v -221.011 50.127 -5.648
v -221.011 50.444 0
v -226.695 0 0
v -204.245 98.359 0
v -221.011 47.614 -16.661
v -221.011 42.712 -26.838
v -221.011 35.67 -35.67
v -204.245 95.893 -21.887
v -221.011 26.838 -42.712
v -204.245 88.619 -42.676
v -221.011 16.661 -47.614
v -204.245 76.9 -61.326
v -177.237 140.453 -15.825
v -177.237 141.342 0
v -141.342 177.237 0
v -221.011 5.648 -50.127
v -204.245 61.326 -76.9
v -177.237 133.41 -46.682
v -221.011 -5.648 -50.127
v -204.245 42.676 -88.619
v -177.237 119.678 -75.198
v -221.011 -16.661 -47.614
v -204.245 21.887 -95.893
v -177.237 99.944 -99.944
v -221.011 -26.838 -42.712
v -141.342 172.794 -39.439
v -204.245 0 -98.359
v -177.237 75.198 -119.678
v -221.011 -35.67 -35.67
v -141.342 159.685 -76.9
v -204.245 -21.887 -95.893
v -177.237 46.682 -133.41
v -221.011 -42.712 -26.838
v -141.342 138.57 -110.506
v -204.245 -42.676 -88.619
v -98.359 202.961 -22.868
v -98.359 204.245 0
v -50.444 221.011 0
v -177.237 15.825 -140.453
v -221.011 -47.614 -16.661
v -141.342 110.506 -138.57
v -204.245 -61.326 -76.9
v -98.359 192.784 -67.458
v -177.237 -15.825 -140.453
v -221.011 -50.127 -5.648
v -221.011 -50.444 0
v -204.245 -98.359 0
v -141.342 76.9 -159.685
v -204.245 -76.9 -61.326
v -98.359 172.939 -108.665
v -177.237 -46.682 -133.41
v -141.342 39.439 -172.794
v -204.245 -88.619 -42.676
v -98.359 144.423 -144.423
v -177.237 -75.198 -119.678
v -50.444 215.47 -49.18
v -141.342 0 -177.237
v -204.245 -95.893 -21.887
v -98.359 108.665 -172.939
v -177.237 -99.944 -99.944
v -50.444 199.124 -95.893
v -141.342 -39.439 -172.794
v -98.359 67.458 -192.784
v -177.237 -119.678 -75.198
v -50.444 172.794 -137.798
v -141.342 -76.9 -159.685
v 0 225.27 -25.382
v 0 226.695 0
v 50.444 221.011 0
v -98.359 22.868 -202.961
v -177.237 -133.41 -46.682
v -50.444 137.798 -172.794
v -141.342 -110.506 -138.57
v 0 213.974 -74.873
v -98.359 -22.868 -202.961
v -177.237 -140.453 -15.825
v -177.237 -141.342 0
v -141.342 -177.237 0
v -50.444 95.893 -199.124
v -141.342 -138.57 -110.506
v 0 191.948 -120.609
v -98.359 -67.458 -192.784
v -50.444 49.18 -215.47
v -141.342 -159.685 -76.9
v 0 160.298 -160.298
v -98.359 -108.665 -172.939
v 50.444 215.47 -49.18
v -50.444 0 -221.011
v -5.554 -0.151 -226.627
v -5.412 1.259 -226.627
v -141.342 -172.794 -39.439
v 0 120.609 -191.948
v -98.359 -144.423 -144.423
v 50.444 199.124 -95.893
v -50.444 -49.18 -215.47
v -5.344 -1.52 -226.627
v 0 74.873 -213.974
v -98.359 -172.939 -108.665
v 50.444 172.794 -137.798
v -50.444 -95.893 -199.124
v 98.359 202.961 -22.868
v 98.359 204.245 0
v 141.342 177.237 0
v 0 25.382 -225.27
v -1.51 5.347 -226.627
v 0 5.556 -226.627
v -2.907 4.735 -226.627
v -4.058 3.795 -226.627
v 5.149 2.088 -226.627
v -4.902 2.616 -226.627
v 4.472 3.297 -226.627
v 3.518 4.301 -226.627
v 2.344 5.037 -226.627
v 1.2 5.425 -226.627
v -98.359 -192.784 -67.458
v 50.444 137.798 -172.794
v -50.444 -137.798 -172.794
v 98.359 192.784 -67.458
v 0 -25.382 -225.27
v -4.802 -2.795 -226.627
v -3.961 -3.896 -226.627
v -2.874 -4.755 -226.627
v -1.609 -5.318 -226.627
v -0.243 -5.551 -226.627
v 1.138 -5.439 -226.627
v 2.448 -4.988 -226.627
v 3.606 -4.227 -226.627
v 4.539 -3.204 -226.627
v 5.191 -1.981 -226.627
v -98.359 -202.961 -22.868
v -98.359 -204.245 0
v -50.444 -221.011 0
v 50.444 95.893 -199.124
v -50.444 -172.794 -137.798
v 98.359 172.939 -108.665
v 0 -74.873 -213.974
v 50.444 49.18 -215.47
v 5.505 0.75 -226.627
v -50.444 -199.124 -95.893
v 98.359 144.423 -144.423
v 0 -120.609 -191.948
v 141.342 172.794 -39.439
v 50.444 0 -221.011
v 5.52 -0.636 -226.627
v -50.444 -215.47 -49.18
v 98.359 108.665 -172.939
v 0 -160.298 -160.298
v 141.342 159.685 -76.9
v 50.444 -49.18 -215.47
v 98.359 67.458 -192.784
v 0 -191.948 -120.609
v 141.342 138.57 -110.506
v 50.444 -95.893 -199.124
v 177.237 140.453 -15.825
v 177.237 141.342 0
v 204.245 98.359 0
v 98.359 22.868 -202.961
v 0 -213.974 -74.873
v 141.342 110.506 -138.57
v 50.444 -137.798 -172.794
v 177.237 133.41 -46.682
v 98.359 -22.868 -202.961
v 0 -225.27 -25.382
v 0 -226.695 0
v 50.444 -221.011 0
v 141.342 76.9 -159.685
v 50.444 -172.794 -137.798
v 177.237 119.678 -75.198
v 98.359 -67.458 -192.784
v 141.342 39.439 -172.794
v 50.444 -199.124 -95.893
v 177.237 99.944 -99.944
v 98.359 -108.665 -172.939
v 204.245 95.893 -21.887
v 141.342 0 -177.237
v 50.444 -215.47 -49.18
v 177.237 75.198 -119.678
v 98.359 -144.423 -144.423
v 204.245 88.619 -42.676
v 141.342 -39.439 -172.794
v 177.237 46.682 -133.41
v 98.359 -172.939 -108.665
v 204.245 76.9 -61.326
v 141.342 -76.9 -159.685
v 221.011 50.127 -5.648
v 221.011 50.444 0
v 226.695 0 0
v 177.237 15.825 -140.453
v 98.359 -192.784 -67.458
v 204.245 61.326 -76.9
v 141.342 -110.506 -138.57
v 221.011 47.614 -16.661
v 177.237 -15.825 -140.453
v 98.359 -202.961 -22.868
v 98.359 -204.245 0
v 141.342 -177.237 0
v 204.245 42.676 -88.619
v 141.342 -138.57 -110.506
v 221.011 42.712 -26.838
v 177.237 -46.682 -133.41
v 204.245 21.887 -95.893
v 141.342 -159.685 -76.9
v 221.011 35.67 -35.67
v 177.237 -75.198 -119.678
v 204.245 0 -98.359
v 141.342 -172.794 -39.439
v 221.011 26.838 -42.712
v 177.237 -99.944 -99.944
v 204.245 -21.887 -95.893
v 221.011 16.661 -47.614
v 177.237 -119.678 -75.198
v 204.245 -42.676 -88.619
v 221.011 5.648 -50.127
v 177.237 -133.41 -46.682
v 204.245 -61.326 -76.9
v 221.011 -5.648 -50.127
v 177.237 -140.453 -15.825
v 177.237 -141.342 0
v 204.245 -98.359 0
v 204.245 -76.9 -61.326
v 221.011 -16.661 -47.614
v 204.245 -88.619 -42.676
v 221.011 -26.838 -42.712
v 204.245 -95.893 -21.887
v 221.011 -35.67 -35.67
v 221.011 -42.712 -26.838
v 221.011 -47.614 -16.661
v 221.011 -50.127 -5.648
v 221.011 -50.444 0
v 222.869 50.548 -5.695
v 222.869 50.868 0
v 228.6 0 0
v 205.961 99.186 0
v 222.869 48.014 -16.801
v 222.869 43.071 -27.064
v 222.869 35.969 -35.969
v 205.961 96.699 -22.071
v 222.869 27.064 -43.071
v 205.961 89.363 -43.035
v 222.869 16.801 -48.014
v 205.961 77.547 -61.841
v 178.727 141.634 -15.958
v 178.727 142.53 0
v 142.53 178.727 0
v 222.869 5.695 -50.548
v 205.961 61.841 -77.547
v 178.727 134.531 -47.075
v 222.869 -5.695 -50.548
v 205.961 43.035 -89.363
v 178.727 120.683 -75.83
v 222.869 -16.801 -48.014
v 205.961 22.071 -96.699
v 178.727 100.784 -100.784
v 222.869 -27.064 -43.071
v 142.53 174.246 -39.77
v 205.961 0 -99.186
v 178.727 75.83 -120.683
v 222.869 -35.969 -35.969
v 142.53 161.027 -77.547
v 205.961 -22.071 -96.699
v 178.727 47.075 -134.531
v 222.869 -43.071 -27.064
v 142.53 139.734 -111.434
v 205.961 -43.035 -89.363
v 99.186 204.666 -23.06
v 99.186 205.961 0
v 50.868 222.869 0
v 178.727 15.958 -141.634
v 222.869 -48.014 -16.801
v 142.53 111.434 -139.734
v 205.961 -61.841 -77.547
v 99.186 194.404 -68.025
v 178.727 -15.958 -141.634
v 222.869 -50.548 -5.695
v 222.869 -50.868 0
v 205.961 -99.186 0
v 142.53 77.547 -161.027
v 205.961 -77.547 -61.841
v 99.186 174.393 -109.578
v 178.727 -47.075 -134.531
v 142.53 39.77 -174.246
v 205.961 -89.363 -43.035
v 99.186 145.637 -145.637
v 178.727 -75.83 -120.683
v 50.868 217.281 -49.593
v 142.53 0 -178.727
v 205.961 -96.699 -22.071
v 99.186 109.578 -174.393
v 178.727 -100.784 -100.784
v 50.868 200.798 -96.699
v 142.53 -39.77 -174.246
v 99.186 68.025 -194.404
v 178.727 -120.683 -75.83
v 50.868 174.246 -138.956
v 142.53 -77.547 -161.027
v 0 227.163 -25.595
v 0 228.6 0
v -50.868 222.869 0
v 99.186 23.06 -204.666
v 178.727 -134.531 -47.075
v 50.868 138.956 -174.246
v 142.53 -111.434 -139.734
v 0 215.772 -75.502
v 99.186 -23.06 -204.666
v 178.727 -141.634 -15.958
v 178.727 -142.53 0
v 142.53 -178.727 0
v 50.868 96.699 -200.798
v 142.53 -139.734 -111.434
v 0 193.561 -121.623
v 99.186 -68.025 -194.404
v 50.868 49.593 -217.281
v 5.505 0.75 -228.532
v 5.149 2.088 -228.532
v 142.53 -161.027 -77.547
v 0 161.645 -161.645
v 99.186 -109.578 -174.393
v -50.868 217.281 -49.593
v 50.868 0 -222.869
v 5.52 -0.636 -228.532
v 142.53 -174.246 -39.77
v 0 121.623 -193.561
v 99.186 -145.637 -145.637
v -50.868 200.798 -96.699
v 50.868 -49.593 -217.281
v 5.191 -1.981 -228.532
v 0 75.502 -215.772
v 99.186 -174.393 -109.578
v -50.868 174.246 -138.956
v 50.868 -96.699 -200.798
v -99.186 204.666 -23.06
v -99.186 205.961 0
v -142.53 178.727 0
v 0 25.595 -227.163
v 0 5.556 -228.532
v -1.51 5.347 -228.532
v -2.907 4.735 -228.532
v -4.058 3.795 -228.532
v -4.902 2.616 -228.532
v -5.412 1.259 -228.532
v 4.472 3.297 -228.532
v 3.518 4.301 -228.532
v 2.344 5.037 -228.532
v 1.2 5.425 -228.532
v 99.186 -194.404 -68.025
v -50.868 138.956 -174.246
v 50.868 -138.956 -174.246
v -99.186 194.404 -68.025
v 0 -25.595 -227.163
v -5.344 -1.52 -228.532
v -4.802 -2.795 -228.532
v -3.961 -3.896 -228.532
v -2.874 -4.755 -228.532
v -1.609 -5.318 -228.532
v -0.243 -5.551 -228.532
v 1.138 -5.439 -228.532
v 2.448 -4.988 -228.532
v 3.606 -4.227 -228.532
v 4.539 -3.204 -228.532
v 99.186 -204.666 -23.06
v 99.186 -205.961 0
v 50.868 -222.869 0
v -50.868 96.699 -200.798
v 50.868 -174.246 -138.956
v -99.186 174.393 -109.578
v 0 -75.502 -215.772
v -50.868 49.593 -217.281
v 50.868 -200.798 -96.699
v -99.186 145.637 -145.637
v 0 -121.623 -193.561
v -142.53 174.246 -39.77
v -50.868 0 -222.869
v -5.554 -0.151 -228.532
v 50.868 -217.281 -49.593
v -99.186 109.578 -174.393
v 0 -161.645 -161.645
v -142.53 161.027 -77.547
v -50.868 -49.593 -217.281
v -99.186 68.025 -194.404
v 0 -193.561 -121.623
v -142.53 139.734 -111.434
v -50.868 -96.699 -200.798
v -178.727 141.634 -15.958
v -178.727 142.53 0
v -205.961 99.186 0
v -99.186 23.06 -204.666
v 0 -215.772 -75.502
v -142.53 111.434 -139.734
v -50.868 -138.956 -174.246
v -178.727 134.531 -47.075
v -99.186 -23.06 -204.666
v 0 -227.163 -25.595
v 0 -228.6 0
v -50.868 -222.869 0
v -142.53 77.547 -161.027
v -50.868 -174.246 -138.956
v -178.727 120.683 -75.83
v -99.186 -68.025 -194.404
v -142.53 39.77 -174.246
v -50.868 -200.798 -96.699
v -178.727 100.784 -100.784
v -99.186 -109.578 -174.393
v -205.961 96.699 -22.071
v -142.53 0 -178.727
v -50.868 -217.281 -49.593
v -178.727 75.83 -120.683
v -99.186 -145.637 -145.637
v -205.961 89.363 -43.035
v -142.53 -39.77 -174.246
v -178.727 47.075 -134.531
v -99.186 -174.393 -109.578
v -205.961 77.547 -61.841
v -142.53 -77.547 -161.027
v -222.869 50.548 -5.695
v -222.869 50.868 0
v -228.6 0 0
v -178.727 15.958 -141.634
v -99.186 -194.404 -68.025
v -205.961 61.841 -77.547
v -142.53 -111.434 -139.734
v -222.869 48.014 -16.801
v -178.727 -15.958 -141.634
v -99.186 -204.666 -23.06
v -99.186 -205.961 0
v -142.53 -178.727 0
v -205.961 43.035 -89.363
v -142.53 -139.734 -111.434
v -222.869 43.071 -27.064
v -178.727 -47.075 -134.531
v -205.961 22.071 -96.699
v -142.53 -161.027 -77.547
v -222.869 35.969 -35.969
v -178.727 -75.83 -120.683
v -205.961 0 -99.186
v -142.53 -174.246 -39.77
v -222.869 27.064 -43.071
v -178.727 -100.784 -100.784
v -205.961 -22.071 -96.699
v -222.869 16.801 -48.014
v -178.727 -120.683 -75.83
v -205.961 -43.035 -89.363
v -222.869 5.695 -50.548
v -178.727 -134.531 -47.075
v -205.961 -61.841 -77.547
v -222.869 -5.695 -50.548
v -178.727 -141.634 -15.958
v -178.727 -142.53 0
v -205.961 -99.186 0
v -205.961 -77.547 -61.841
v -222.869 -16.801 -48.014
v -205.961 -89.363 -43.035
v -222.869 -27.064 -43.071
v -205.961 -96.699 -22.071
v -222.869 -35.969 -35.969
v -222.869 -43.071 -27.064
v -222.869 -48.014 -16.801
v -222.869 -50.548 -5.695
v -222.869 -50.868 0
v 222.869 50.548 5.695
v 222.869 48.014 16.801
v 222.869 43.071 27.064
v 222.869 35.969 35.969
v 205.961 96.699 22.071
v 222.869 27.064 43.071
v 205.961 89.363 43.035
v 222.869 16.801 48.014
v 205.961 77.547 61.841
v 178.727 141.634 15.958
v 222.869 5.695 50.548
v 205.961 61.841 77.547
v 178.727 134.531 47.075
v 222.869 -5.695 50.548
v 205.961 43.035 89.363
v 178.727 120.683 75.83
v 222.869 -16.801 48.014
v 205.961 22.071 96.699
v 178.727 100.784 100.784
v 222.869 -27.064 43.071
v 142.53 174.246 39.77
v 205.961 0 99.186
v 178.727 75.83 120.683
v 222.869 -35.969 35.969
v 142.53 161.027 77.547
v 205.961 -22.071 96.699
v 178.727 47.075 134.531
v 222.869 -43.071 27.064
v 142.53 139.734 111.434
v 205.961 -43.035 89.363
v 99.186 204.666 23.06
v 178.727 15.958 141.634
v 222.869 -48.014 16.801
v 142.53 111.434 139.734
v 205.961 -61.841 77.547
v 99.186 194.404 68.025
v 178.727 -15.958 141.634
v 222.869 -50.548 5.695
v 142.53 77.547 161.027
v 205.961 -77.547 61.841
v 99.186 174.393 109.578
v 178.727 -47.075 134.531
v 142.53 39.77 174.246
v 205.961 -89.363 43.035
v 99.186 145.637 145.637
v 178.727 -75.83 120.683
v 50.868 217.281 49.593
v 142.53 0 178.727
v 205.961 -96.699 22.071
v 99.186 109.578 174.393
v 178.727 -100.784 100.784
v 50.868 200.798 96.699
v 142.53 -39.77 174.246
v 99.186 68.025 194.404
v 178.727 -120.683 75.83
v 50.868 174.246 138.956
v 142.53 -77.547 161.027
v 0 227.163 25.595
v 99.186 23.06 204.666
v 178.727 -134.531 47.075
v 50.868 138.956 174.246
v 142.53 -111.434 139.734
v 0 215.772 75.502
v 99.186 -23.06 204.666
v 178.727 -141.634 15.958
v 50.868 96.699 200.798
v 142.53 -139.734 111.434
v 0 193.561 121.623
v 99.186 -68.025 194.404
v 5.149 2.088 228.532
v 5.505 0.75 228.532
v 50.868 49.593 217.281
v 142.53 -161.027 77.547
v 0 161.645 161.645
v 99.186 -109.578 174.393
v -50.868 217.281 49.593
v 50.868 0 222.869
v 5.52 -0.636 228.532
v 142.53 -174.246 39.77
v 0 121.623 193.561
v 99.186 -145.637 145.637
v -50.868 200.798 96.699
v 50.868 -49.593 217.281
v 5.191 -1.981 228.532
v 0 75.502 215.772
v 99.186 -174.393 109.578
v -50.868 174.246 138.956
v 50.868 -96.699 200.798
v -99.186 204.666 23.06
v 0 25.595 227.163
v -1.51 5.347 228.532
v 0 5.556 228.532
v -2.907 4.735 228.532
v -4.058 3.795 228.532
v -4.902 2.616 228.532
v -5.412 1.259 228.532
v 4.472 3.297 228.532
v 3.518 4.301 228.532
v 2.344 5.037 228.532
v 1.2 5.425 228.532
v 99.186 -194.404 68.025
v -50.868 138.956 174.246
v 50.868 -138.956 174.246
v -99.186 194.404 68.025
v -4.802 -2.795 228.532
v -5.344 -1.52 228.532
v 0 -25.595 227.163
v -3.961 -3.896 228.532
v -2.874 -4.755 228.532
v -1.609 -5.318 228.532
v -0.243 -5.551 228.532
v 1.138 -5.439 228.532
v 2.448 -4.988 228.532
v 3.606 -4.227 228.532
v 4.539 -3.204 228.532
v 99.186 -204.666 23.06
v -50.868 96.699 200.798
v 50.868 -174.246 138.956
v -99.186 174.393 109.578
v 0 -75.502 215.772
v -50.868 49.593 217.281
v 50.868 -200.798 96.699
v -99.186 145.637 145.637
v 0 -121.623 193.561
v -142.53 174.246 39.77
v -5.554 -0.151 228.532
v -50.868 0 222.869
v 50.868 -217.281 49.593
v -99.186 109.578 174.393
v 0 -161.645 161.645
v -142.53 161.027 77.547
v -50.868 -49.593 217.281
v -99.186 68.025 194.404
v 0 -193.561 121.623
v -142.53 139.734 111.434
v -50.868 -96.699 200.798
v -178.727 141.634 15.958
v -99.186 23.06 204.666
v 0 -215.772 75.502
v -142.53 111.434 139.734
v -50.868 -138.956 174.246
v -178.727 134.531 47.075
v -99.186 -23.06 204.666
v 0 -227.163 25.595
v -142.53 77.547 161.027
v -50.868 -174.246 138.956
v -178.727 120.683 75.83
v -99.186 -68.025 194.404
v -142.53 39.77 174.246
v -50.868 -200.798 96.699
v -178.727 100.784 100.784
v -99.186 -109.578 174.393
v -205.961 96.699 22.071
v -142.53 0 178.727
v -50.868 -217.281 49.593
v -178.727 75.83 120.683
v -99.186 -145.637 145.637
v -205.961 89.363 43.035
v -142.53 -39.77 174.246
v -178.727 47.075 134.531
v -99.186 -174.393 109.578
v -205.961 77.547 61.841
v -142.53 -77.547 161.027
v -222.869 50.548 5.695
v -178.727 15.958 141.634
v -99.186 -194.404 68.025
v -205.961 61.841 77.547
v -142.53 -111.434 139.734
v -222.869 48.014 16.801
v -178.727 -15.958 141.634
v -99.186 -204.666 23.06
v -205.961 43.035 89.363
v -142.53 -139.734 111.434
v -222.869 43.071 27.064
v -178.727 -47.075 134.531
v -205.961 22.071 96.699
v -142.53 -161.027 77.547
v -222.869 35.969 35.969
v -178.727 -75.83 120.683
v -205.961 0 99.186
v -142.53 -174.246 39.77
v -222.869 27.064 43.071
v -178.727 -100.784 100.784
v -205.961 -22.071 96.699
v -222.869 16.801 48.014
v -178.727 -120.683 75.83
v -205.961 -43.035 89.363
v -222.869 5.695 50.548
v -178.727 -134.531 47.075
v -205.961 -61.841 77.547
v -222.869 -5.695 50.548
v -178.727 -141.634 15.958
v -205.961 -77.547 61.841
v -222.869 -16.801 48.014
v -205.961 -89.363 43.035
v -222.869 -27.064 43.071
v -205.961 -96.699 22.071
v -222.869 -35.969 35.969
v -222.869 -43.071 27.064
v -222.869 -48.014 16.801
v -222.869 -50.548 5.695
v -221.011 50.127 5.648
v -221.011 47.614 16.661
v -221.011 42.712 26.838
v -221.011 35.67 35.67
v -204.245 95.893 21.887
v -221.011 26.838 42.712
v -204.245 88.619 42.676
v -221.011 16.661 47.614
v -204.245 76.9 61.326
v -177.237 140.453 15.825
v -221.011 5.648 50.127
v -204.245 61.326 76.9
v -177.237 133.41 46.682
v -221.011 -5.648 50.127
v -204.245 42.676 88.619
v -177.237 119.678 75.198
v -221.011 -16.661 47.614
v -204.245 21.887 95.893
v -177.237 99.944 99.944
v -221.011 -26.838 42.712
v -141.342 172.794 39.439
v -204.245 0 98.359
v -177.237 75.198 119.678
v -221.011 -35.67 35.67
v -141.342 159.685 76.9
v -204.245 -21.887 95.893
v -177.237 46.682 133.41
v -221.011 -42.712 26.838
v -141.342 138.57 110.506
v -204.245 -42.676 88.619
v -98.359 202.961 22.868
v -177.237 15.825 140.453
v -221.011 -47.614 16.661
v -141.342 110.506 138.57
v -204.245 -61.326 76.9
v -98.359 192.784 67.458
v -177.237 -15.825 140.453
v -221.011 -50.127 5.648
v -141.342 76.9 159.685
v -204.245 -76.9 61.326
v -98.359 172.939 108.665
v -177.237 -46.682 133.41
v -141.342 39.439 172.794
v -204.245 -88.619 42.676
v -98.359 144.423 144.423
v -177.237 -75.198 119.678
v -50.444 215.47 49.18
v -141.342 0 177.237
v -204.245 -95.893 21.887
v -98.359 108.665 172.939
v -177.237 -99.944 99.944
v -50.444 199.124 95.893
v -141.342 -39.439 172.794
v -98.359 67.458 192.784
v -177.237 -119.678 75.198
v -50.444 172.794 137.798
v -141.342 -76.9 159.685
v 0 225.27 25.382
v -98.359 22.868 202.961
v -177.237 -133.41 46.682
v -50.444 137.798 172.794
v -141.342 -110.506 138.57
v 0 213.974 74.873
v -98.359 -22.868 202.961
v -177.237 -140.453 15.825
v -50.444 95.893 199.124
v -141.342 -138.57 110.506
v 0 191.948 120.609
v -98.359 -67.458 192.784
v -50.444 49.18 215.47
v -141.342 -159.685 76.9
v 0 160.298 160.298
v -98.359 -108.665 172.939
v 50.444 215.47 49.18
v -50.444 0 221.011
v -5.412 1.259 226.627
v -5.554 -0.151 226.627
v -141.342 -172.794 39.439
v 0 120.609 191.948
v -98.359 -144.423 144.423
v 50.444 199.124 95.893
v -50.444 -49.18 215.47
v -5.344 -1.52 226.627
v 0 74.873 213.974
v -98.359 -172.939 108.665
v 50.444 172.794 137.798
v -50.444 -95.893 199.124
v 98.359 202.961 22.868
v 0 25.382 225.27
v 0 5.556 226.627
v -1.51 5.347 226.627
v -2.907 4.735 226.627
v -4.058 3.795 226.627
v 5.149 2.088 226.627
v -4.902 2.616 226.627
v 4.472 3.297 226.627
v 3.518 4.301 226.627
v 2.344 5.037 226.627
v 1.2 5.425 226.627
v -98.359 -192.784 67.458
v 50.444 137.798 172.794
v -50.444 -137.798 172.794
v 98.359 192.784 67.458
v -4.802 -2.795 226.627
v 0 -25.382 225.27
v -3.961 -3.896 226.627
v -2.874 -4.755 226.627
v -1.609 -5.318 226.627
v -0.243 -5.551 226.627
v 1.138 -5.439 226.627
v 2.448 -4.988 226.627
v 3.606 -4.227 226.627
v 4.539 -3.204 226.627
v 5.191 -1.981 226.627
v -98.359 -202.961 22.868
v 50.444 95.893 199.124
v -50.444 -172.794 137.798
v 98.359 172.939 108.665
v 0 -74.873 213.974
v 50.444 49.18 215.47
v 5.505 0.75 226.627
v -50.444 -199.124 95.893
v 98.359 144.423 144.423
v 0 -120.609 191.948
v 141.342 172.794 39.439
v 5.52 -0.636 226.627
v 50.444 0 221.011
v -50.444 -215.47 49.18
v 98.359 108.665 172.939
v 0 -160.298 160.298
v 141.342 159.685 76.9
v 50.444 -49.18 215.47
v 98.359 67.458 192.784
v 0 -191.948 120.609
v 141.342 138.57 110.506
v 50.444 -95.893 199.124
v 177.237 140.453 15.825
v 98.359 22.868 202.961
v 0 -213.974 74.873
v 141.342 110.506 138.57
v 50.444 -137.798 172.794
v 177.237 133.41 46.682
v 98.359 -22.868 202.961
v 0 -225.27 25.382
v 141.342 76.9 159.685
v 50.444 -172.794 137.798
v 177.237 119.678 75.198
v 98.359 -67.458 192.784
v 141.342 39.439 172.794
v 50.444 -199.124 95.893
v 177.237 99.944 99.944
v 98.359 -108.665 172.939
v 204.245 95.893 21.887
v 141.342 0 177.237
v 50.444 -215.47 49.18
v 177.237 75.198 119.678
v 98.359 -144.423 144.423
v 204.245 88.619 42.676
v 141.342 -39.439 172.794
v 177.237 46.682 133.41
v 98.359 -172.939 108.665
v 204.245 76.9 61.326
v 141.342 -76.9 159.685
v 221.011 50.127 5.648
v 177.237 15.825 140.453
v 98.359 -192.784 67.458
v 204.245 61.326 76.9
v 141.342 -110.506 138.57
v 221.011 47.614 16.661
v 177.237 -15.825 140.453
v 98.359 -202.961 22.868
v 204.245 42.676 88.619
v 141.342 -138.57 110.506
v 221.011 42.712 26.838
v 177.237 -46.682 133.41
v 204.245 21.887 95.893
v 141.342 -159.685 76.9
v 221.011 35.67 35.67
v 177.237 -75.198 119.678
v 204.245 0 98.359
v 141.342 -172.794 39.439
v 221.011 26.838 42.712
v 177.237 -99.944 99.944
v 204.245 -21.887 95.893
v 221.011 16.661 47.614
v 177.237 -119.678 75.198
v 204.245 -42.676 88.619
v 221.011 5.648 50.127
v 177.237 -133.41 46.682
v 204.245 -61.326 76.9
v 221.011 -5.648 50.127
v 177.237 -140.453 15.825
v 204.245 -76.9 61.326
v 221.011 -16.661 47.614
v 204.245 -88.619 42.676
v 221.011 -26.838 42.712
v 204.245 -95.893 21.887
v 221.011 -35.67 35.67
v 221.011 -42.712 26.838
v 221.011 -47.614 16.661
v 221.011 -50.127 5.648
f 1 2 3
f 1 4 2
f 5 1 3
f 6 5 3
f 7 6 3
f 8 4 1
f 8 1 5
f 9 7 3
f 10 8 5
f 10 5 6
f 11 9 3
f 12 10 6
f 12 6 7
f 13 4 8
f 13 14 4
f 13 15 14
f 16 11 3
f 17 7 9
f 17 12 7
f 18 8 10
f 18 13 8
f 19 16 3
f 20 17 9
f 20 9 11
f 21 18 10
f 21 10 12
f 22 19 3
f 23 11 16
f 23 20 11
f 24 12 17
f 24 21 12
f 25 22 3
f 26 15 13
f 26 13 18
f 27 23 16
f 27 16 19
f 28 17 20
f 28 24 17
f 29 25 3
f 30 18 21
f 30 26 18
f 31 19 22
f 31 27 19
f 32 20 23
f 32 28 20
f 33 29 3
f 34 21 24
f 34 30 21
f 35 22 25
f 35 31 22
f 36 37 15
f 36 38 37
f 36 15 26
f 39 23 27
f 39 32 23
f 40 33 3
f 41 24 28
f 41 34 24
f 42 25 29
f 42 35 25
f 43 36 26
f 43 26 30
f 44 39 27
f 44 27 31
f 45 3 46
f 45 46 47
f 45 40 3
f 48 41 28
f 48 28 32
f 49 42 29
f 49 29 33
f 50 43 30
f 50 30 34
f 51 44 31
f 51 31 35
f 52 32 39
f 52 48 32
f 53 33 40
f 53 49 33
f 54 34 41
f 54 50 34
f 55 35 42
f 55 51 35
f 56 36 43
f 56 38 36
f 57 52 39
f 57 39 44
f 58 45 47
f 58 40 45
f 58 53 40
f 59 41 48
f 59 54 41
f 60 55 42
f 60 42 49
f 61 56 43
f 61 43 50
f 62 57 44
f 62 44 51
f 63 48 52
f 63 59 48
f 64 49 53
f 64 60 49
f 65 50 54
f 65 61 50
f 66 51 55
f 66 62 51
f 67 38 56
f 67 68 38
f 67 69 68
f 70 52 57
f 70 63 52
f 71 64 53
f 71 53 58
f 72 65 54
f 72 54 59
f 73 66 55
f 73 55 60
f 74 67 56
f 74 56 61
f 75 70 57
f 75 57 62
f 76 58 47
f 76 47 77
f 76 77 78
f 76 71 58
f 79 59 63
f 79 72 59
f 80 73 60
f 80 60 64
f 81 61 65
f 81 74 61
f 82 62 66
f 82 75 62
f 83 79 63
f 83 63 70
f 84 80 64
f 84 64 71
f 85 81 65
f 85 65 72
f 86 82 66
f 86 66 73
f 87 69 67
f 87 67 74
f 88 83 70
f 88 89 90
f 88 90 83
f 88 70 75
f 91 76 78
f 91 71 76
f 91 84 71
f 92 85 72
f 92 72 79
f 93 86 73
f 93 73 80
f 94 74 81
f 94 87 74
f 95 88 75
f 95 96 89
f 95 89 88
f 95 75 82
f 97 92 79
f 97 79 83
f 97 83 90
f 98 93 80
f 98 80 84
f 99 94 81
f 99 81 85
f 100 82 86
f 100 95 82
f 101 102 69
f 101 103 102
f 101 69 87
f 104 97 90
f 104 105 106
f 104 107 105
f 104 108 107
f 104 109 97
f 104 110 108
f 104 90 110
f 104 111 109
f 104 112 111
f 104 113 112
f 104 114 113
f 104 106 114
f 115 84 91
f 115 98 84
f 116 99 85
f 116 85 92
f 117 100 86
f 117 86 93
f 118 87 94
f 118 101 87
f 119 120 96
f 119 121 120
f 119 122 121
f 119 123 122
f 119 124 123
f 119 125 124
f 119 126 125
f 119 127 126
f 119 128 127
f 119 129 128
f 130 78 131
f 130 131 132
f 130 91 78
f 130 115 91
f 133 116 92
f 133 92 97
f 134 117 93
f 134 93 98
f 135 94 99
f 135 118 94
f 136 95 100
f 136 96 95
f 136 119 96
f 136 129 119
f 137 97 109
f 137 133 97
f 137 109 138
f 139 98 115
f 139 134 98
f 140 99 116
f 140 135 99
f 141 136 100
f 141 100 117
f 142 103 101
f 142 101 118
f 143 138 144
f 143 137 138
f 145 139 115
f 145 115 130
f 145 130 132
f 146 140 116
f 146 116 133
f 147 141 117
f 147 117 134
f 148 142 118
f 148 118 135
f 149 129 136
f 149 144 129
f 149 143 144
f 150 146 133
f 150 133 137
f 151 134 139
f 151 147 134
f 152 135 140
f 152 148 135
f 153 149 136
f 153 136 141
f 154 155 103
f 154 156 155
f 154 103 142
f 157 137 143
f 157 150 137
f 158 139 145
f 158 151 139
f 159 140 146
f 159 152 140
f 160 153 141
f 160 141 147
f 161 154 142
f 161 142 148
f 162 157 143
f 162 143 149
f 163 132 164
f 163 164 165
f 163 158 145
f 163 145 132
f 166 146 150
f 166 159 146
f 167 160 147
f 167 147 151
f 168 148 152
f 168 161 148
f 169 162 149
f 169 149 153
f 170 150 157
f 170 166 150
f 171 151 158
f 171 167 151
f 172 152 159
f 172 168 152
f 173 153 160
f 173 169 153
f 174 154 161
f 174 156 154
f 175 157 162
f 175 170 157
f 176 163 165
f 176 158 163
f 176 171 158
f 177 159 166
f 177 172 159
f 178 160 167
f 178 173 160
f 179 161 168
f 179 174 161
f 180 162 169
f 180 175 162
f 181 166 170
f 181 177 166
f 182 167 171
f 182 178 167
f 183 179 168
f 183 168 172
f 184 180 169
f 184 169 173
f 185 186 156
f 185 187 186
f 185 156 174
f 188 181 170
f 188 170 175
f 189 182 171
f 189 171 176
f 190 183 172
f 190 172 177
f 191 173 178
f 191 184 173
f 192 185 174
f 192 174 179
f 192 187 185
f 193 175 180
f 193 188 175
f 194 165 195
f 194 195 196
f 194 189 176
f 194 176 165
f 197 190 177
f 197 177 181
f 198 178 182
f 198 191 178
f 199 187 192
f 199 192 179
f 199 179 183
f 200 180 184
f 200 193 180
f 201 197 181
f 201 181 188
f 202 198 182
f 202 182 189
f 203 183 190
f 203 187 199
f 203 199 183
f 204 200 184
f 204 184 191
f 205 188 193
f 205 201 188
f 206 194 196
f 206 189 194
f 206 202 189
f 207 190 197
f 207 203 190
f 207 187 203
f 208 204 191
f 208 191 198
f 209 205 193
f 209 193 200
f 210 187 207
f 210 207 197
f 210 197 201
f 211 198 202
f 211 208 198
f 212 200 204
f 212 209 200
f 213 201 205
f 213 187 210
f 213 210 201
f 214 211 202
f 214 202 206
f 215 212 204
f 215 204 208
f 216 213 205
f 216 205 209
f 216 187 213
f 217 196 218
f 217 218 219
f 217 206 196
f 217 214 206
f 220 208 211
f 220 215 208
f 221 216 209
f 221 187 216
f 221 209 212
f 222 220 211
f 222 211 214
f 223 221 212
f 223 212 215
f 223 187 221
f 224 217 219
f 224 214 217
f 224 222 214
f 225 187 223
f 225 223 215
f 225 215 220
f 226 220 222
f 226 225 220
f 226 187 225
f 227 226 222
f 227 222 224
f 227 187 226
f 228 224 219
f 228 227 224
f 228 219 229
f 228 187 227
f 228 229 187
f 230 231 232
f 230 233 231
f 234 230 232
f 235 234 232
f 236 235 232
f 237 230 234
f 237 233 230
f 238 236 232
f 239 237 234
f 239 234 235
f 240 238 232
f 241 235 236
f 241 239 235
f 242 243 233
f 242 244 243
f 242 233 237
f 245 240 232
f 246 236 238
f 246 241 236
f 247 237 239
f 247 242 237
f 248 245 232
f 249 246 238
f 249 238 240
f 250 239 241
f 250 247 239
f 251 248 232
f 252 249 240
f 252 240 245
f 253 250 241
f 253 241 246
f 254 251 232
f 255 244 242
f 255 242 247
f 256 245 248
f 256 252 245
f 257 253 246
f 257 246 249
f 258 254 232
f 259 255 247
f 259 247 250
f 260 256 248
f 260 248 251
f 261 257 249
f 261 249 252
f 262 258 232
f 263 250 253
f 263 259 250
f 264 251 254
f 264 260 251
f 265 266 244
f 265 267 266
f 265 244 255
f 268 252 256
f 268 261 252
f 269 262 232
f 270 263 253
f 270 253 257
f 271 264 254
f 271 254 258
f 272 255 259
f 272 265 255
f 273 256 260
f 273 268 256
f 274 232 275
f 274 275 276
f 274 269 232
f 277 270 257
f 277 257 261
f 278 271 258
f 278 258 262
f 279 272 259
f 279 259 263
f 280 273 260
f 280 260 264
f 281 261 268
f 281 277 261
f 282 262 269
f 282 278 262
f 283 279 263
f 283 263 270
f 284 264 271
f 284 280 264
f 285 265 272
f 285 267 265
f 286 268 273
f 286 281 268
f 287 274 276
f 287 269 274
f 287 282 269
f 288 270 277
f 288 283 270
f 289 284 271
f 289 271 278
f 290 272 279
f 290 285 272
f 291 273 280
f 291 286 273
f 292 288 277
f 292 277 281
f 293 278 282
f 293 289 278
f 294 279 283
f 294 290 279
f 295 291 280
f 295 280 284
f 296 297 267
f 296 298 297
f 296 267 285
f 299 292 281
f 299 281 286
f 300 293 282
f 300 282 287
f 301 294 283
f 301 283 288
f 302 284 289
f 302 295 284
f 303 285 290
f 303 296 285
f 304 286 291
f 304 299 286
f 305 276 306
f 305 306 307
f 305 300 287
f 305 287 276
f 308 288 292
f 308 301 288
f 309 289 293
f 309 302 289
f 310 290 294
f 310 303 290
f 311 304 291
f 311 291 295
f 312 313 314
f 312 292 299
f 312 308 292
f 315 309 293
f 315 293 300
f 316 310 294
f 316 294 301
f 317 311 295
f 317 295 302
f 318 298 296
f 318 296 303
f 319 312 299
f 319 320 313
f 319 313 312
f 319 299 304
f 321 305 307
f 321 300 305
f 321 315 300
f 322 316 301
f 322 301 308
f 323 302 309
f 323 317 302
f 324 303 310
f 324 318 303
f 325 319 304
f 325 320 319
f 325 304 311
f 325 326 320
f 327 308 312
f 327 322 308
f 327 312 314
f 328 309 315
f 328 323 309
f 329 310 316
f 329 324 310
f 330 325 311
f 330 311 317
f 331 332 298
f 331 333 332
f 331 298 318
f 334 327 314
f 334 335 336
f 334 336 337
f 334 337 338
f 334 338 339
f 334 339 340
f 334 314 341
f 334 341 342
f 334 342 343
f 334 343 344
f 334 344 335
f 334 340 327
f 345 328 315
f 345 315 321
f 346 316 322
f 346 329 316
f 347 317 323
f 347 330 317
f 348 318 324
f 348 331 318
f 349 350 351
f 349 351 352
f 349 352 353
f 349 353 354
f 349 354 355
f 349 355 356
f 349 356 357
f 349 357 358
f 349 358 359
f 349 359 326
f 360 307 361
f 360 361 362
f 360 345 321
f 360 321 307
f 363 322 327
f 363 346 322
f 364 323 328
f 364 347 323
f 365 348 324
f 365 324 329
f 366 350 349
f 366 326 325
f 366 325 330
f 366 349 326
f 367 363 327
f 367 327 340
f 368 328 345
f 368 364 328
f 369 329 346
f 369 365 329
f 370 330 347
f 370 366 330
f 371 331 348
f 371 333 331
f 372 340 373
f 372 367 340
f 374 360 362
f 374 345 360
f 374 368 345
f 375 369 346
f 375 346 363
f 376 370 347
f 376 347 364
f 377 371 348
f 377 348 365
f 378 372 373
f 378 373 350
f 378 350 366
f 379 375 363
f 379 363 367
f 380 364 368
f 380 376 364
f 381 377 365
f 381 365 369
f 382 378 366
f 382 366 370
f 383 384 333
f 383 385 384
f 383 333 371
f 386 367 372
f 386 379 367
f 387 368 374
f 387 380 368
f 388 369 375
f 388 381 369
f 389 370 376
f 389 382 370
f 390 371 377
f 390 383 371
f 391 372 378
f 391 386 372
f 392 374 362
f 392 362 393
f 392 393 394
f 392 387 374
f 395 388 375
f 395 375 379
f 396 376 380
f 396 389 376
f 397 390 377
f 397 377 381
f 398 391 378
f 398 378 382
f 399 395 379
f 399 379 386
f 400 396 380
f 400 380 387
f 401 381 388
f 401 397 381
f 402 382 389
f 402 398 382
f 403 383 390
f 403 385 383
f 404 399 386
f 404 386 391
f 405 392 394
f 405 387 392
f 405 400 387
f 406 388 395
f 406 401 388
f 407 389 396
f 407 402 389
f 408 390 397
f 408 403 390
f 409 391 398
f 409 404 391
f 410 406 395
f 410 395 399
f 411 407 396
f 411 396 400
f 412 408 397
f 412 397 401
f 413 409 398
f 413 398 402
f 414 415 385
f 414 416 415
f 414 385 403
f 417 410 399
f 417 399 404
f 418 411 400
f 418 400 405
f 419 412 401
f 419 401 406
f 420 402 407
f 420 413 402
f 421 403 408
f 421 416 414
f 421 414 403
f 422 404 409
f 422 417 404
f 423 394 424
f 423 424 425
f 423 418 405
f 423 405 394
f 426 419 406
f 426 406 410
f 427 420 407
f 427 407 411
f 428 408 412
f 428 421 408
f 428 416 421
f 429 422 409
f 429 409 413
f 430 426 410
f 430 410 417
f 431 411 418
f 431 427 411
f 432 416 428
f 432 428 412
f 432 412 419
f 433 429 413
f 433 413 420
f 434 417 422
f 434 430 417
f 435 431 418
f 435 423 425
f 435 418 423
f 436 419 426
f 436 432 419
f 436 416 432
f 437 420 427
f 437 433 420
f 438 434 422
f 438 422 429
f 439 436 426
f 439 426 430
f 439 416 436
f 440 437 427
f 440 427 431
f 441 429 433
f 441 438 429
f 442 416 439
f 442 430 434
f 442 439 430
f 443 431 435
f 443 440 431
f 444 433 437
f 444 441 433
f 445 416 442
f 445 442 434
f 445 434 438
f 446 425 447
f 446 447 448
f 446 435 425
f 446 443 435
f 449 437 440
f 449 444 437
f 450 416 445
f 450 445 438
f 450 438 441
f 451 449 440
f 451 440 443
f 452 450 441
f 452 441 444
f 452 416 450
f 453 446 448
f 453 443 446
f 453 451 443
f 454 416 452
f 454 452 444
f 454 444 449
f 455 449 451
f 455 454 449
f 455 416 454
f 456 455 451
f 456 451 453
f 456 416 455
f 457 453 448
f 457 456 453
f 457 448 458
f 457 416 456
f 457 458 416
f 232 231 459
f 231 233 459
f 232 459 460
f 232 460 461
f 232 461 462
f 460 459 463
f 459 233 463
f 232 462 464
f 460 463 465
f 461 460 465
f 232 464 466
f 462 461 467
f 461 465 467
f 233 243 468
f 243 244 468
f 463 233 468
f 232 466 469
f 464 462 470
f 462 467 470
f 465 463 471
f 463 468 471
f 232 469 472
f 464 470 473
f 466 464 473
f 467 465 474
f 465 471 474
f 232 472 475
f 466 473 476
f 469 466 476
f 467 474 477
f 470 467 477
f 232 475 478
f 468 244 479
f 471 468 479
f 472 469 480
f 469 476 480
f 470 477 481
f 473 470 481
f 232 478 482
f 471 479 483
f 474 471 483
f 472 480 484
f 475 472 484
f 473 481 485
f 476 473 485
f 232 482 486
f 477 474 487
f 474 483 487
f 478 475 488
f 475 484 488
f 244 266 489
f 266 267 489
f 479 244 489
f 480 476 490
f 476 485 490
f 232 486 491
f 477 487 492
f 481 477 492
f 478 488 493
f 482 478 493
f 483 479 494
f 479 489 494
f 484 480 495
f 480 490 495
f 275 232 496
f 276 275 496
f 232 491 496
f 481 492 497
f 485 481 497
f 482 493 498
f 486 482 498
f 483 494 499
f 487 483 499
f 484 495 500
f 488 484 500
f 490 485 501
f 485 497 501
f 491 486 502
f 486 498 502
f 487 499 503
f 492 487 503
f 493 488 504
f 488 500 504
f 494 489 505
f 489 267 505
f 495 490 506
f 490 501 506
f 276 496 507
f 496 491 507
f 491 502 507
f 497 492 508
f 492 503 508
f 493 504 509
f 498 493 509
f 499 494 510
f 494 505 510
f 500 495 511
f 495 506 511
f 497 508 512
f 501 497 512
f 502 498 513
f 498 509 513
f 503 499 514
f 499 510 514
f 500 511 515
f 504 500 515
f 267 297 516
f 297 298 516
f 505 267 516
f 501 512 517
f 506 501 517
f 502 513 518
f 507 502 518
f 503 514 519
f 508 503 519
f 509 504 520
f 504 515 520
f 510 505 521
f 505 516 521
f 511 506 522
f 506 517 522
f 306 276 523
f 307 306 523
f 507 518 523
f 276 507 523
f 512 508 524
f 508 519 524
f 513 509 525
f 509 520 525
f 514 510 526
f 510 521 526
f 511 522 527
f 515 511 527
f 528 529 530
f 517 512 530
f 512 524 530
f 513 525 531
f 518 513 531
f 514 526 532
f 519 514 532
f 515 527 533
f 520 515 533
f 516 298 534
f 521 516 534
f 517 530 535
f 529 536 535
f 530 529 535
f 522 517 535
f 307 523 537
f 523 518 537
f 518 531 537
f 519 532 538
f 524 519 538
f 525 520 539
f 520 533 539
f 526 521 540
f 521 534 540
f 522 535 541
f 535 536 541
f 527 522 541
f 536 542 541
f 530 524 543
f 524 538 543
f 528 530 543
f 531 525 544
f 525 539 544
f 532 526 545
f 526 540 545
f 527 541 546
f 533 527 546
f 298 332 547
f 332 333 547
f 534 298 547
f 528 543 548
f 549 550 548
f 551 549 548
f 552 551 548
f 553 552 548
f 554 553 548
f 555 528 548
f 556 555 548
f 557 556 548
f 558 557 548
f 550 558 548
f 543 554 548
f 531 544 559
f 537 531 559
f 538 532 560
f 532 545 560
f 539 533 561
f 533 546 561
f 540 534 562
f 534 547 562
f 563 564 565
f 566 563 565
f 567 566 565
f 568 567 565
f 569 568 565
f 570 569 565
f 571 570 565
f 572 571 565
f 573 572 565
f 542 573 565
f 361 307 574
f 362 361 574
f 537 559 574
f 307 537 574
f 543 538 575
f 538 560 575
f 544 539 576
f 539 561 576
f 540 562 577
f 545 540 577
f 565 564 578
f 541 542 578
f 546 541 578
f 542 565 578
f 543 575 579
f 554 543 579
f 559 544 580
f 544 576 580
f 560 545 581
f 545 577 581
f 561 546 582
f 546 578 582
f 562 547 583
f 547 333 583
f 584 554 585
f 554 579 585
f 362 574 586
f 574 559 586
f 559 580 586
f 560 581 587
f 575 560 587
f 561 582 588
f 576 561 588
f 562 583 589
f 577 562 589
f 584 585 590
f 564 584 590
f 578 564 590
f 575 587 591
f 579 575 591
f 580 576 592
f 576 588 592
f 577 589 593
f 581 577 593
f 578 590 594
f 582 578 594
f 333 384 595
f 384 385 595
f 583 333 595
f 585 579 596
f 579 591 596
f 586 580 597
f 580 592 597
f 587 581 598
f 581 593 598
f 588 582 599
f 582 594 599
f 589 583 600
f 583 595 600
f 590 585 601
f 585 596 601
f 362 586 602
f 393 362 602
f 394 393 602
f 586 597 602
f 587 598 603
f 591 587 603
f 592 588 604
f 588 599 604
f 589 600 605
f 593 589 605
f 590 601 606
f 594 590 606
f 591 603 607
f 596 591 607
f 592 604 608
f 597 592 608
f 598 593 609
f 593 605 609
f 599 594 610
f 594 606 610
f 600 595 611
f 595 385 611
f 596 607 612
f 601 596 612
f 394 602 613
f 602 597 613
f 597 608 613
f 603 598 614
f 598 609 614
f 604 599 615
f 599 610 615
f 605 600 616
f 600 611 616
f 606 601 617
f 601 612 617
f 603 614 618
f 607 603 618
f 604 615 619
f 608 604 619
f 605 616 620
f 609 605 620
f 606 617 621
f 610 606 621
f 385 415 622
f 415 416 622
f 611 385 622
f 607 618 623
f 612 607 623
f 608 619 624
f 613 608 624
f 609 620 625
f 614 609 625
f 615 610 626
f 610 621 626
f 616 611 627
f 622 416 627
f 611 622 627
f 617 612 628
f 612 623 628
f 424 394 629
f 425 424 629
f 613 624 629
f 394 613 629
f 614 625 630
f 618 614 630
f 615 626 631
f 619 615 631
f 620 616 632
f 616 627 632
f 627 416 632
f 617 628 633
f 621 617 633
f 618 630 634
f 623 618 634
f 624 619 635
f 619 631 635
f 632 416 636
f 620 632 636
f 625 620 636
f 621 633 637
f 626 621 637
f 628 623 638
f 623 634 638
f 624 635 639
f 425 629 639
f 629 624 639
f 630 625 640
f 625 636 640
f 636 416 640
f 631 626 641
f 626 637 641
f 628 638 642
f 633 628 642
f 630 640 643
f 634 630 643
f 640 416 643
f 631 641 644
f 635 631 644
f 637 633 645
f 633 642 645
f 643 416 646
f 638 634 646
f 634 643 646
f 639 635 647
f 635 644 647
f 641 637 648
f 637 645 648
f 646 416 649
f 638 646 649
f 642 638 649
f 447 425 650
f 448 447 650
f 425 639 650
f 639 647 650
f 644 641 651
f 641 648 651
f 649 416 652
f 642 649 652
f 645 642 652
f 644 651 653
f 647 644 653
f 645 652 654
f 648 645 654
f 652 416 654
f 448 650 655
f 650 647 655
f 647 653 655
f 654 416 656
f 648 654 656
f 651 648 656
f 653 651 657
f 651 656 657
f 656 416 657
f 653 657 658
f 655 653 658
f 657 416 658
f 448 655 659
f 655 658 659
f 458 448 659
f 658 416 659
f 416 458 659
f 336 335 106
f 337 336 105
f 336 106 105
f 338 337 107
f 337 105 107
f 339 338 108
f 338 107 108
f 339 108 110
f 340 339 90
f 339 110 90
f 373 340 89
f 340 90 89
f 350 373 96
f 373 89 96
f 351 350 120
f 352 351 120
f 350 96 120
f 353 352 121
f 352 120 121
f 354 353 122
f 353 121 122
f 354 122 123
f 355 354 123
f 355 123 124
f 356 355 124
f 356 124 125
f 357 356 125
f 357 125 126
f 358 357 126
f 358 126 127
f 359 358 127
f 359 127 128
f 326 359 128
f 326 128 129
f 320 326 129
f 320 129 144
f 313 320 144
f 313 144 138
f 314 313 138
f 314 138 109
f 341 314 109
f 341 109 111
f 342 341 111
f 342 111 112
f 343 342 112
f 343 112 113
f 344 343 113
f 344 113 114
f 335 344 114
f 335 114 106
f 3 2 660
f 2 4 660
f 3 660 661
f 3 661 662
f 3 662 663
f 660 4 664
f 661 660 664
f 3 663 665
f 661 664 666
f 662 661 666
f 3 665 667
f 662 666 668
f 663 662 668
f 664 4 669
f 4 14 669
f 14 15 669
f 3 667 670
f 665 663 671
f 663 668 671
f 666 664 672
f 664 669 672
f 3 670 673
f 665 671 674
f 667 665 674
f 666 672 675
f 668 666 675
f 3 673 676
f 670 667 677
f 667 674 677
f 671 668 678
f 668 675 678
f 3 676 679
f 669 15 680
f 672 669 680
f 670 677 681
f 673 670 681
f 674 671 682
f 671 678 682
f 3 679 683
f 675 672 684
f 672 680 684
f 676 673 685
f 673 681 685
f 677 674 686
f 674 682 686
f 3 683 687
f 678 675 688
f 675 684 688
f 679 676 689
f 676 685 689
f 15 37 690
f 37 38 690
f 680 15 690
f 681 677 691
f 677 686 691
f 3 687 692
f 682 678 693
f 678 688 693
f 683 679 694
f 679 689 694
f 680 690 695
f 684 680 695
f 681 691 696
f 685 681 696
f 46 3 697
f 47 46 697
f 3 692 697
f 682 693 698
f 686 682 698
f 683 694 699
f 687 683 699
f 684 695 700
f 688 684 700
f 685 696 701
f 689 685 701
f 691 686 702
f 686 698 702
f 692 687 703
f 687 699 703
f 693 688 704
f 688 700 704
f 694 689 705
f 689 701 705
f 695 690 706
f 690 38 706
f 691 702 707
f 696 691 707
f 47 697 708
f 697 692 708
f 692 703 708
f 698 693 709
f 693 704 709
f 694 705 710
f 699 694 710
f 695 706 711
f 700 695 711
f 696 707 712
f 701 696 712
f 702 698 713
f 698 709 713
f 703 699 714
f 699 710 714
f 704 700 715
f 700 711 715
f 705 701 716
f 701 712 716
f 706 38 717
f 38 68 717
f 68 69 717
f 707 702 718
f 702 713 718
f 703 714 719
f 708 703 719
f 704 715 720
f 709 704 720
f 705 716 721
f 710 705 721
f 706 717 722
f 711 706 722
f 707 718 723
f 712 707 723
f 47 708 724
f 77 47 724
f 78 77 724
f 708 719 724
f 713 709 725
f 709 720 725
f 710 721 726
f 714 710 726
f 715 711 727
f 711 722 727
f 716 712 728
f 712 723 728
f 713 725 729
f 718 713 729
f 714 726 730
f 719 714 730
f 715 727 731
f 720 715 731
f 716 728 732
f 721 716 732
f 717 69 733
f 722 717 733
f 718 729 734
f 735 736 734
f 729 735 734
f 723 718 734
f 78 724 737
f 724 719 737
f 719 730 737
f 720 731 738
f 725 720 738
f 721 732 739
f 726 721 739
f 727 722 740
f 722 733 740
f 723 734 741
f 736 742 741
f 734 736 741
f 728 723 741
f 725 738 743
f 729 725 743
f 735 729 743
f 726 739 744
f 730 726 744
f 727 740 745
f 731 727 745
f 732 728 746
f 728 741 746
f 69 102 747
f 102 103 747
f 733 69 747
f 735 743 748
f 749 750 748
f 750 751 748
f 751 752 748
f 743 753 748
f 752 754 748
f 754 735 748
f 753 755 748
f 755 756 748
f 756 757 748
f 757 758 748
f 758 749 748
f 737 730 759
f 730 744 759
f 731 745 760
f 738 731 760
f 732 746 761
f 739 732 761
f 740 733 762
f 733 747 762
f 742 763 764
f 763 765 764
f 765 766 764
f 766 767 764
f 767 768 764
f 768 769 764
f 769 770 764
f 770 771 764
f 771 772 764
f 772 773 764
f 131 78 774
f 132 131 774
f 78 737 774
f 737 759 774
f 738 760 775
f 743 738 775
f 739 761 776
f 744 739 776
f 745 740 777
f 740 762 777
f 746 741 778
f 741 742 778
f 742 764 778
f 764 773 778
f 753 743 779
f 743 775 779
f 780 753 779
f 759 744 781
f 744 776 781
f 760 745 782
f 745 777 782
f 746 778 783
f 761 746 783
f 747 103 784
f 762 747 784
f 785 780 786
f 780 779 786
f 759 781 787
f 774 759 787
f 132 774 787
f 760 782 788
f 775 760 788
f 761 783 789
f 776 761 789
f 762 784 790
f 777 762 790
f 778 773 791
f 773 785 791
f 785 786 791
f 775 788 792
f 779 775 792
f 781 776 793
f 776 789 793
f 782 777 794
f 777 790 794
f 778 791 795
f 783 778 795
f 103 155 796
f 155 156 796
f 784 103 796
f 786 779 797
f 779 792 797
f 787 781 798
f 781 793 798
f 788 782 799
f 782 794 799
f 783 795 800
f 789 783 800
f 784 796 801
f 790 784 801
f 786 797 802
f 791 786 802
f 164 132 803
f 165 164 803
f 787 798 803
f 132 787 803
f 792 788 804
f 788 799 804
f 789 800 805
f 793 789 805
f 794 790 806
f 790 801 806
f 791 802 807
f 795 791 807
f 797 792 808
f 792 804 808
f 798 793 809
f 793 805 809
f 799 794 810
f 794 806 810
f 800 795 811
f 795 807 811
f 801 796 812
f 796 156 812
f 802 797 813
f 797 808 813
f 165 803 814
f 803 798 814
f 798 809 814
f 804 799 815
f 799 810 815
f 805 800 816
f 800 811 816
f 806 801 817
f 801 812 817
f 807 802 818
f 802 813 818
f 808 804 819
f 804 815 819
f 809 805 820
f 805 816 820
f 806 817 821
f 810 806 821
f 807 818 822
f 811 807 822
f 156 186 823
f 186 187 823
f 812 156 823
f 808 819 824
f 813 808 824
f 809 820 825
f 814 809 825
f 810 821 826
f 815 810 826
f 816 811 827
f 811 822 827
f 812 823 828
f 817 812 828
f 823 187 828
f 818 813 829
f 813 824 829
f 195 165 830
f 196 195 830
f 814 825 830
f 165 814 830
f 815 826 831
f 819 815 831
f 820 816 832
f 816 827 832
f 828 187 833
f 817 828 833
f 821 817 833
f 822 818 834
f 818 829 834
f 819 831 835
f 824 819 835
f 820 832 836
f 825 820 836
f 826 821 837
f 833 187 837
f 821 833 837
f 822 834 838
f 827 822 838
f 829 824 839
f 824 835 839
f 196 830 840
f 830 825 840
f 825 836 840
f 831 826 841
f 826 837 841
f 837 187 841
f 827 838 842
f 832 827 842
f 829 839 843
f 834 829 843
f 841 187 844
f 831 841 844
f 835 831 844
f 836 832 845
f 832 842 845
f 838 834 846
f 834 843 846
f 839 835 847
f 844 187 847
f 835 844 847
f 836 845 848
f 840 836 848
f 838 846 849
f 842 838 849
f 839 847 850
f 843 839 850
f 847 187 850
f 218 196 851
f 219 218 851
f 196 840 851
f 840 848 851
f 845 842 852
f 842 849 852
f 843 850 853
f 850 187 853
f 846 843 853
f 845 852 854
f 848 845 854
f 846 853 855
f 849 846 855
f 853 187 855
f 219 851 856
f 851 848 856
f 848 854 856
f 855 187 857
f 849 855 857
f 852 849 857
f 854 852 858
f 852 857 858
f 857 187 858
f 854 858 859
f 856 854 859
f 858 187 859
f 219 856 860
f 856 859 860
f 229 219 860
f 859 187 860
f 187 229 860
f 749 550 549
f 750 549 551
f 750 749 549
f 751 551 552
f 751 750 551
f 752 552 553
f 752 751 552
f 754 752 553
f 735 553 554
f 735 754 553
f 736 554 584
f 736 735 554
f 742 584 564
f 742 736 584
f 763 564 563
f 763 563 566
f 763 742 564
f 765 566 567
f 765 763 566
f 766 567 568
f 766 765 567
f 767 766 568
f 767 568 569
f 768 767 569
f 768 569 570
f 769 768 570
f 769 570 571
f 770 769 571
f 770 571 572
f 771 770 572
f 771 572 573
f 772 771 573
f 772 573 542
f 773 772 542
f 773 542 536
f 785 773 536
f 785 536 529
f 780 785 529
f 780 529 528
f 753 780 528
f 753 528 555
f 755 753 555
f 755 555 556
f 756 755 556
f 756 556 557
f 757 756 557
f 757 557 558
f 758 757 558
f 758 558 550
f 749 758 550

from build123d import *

# Parameters (mm, degrees)
REVOLVE6_ANGLE          = 180.0000000000004
CUT_EXTRUDE1_DEPTH      = 581.8775086022882
CUT_EXTRUDE1_DEPTH_BACK = 581.8775086022882
SKETCH2_R               = 5.5562499999999995


with BuildPart() as part:
    # Sketch1 → Revolve6 (revolve)
    with BuildSketch(Plane.XY):
        with BuildLine():
            Line((-228.59999999999997, 0), (-226.69500000000002, 0))
            ThreePointArc((-226.69500000000002, 0), (1.388e-14, 226.69500000000002), (226.69500000000002, 0))
            Line((226.69500000000002, 0), (228.59999999999997, 0))
            ThreePointArc((228.59999999999997, 0), (1.4e-14, 228.59999999999997), (-228.59999999999997, 0))
        make_face()
    revolve(axis=Axis((0, 0, 0), (1, 0, 0)), revolution_arc=REVOLVE6_ANGLE)

    # Sketch2 → Cut-Extrude1 (cut, two sides: drawn at the far end of the back side and taken through both)
    with BuildSketch(Plane(origin=(5.98e-15, 3.56628e-12, -253.99999999999983), x_dir=(-0.9340477296722021, -0.3571482027033107, -2.4939525698799316e-15), z_dir=(0, -6.98e-15, 1)).offset(-CUT_EXTRUDE1_DEPTH_BACK)):
        with Locations(Location((6.4581e-13, 1.67225e-12, 0), (0, 0, 249.074839669))):
            Circle(SKETCH2_R)
    extrude(amount=CUT_EXTRUDE1_DEPTH + CUT_EXTRUDE1_DEPTH_BACK, mode=Mode.SUBTRACT)

    # Mirror1: part across plane


with BuildPart() as part_1:
    add(part.part)
    add(part.part.mirror(Plane.XY))


solid = part_1.part
